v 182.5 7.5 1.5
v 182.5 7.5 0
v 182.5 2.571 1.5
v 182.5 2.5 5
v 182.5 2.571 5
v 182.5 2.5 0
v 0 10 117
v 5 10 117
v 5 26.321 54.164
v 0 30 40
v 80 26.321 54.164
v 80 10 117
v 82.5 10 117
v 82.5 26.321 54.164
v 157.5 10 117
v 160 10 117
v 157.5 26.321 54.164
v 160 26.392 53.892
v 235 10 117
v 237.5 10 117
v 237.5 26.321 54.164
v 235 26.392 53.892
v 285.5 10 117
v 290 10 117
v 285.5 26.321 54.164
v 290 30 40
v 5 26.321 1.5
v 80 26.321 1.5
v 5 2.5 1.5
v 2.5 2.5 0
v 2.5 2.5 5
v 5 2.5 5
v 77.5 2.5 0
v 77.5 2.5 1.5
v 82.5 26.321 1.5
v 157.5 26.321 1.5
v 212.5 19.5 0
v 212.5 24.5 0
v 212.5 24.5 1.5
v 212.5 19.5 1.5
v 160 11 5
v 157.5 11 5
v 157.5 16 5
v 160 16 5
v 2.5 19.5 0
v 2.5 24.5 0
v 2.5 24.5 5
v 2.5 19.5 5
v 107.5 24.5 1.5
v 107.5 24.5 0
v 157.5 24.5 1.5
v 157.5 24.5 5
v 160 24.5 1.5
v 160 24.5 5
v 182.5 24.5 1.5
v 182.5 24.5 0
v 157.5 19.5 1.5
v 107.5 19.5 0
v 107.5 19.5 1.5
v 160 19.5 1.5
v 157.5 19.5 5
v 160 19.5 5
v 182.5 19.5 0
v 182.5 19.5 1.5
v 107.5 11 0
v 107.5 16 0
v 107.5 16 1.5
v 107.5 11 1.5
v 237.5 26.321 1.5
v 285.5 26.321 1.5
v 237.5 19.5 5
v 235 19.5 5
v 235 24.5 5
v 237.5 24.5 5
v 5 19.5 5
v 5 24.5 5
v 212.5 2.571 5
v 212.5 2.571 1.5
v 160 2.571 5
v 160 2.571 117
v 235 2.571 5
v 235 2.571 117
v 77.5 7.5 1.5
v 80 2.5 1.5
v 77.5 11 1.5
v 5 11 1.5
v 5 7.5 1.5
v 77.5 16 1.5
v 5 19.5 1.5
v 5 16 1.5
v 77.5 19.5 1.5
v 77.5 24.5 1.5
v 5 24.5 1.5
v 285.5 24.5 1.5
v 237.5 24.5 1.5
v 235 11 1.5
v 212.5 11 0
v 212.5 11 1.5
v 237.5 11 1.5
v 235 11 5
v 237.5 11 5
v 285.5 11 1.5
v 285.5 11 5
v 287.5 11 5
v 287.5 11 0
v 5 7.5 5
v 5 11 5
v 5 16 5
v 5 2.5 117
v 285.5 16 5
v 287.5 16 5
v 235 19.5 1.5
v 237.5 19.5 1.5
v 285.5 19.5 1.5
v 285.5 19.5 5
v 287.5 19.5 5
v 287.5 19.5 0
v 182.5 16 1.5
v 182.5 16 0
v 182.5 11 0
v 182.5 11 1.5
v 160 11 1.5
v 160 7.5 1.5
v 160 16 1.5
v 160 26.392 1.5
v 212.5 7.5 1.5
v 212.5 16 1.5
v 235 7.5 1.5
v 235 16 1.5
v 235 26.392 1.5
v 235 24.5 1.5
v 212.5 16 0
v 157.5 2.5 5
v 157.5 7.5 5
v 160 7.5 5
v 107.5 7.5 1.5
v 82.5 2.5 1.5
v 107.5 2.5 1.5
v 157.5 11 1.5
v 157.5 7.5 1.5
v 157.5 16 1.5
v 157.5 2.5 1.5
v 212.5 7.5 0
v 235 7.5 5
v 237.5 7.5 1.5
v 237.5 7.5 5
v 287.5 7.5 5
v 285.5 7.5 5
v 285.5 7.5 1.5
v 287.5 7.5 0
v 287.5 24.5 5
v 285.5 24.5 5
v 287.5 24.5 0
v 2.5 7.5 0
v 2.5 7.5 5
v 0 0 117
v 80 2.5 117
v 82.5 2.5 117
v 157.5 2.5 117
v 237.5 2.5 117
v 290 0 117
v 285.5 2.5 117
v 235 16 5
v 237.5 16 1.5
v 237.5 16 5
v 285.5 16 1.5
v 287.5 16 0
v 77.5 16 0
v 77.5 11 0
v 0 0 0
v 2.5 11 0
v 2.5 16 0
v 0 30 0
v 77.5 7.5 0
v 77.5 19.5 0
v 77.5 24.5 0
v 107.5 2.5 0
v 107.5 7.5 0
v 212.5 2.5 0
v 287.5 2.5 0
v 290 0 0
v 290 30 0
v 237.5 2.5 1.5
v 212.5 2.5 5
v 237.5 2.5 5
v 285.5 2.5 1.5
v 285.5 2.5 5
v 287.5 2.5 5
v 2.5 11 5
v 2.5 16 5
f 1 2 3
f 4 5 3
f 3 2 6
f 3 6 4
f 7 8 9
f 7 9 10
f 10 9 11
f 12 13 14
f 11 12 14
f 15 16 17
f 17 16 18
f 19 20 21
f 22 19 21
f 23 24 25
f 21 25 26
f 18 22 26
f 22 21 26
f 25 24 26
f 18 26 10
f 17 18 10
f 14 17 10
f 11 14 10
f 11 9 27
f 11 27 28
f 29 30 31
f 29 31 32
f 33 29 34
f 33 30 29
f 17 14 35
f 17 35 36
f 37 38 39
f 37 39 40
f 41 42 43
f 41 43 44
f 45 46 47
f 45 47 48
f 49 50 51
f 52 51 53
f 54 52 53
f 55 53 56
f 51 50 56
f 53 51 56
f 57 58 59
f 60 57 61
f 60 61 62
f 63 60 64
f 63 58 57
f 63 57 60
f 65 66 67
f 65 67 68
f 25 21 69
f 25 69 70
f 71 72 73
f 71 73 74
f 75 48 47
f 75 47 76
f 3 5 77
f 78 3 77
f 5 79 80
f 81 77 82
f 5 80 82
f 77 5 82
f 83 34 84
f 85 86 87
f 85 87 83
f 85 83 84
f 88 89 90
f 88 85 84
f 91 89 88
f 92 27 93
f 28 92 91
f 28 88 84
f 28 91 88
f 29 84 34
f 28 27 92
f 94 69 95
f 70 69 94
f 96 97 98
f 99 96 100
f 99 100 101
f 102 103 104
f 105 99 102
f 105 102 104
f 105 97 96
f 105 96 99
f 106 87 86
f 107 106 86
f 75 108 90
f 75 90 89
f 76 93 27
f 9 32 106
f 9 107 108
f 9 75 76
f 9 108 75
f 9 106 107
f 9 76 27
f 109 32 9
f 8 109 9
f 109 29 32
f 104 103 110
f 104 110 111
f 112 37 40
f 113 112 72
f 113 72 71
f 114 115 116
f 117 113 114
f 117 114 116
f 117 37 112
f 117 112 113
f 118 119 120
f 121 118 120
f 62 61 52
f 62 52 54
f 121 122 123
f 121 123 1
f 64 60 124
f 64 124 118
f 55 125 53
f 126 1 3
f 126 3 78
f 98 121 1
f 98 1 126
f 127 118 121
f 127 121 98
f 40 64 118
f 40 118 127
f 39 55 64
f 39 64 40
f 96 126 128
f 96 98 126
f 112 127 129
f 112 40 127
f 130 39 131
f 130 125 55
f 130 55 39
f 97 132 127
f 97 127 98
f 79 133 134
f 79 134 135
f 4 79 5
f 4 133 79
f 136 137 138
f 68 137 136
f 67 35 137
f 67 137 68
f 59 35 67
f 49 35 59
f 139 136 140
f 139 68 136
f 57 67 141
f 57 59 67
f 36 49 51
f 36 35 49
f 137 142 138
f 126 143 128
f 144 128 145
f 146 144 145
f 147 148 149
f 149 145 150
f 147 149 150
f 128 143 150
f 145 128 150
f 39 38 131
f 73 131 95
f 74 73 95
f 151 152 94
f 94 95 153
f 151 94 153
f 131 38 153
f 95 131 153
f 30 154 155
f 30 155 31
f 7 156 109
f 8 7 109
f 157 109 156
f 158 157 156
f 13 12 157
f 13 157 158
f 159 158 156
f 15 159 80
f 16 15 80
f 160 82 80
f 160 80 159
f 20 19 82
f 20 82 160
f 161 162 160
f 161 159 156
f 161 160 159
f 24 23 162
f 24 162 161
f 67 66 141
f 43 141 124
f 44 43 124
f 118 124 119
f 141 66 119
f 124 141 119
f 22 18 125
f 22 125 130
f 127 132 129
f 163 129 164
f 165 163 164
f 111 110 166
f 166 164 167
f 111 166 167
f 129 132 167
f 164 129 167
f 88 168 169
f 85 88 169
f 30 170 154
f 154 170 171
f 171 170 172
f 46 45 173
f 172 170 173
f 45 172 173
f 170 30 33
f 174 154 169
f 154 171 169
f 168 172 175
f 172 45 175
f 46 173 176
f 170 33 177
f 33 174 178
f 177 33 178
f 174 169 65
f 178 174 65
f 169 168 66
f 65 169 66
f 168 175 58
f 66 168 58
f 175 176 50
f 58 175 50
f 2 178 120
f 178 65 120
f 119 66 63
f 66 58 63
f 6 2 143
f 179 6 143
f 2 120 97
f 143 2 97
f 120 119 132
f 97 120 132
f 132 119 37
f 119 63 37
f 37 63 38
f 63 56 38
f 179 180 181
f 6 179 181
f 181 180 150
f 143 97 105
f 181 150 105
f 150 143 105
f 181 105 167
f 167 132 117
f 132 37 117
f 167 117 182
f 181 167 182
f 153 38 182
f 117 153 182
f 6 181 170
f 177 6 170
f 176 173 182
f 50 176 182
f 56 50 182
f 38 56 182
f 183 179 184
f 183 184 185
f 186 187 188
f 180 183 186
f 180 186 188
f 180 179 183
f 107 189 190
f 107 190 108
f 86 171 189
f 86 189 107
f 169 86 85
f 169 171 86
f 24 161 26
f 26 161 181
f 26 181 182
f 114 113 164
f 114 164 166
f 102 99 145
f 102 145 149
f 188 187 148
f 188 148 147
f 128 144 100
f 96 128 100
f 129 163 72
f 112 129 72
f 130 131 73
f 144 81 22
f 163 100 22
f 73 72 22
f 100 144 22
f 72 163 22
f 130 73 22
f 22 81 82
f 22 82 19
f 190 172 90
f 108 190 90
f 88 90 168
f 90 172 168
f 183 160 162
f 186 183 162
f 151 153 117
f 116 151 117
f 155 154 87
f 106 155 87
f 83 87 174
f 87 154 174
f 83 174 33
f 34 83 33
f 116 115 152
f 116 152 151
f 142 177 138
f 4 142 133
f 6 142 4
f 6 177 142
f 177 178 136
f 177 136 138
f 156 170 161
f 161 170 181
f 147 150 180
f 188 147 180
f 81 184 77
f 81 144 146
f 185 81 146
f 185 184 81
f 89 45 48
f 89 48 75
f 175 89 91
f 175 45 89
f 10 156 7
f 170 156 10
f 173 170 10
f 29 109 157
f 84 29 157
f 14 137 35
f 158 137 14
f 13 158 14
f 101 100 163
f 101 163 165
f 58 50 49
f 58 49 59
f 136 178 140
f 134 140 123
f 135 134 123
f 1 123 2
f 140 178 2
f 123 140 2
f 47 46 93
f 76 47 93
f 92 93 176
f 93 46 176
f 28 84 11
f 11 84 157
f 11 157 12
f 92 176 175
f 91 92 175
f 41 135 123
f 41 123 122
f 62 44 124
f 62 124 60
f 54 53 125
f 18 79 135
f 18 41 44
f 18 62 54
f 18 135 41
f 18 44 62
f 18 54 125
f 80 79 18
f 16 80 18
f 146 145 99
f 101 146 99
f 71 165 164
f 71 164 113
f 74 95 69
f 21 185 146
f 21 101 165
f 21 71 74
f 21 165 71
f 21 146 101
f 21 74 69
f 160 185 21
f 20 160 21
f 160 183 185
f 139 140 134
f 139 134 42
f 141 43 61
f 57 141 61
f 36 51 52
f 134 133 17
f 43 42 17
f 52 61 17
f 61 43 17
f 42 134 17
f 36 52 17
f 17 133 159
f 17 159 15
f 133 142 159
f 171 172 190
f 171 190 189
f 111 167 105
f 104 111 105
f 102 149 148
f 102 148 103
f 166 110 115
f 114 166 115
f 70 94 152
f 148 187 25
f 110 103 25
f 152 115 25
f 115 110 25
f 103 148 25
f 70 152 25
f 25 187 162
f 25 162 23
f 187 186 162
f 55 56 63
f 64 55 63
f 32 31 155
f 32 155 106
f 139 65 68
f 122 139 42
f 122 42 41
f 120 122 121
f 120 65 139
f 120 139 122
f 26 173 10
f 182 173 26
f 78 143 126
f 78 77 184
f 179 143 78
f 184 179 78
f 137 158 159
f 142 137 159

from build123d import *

# Parameters (mm, degrees)
BOX_W                              = 290
BOX_H                              = 30
BOX_DEPTH                          = 117
SKETCH_W                           = 75
SKETCH_H                           = 23.820949
SKETCH_W_2                         = 48
POCKET_DEPTH                       = 115.5
POCKET001_DEPTH                    = 350
SKETCH002_W                        = 75
SKETCH002_H                        = 5
POCKET002_DEPTH                    = 5
SKETCH002_LINEARPATTERN001_2_W     = 75
SKETCH002_LINEARPATTERN001_2_H     = 5
POCKET002_LINEARPATTERN001_2_DEPTH = 5
SKETCH002_LINEARPATTERN001_3_W     = 75
SKETCH002_LINEARPATTERN001_3_H     = 5
POCKET002_LINEARPATTERN001_3_DEPTH = 5
LINEARPATTERN002_COUNT             = 3
LINEARPATTERN002_PITCH             = 8.5


with BuildPart() as part:
    # Box → Box (new body)
    with BuildSketch(Plane.XY):
        with Locations((145, 15)):
            Rectangle(BOX_W, BOX_H)
    extrude(amount=BOX_DEPTH)

    # Sketch (on Face6 of BaseFeature) → Pocket (cut)
    with BuildSketch(Plane.XY.offset(117)):
        with Locations((42.5, 14.410474)):
            Rectangle(SKETCH_W, SKETCH_H)
        with Locations((120, 14.410474)):
            Rectangle(SKETCH_W, SKETCH_H)
        with Locations((197.5, 14.481185)):
            Rectangle(SKETCH_W, SKETCH_H)
        with Locations((261.5, 14.410474)):
            Rectangle(SKETCH_W_2, SKETCH_H)
    extrude(amount=-POCKET_DEPTH, mode=Mode.SUBTRACT)

    # Sketch001 → Pocket001 (cut)
    with BuildSketch(Plane.YZ.offset(314)):
        Polygon((10, 117), (30, 40), (40, 120), align=None)
    extrude(amount=-POCKET001_DEPTH, mode=Mode.SUBTRACT)

    # Sketch002 (on Face5 of Pocket001) → Pocket002 (cut)
    with BuildSketch(Plane(origin=(0, 0, 0), x_dir=(1, 0, 0), z_dir=(0, 0, -1))):
        with Locations((40, -5)):
            Rectangle(SKETCH002_W, SKETCH002_H)
    pocket002 = extrude(amount=-POCKET002_DEPTH, mode=Mode.SUBTRACT)

    # Sketch002 LinearPattern001 2 → Pocket002 LinearPattern001 2 (cut)
    with BuildSketch(Plane(origin=(105, 0, 0), x_dir=(1, 0, 0), z_dir=(0, 0, -1))):
        with Locations((40, -5)):
            Rectangle(SKETCH002_LINEARPATTERN001_2_W, SKETCH002_LINEARPATTERN001_2_H)
    pocket002_linearpattern001_2 = extrude(amount=-POCKET002_LINEARPATTERN001_2_DEPTH, mode=Mode.SUBTRACT)

    # Sketch002 LinearPattern001 3 → Pocket002 LinearPattern001 3 (cut)
    with BuildSketch(Plane(origin=(210, 0, 0), x_dir=(1, 0, 0), z_dir=(0, 0, -1))):
        with Locations((40, -5)):
            Rectangle(SKETCH002_LINEARPATTERN001_3_W, SKETCH002_LINEARPATTERN001_3_H)
    pocket002_linearpattern001_3 = extrude(amount=-POCKET002_LINEARPATTERN001_3_DEPTH, mode=Mode.SUBTRACT)

    # LinearPattern002: Pocket002, Pocket002 LinearPattern001 2, Pocket002 LinearPattern001 3 ×3
    with Locations(*[(0, i * LINEARPATTERN002_PITCH, 0) for i in range(1, LINEARPATTERN002_COUNT)]):
        add(pocket002, mode=Mode.SUBTRACT)
        add(pocket002_linearpattern001_2, mode=Mode.SUBTRACT)
        add(pocket002_linearpattern001_3, mode=Mode.SUBTRACT)


solid = part.part
